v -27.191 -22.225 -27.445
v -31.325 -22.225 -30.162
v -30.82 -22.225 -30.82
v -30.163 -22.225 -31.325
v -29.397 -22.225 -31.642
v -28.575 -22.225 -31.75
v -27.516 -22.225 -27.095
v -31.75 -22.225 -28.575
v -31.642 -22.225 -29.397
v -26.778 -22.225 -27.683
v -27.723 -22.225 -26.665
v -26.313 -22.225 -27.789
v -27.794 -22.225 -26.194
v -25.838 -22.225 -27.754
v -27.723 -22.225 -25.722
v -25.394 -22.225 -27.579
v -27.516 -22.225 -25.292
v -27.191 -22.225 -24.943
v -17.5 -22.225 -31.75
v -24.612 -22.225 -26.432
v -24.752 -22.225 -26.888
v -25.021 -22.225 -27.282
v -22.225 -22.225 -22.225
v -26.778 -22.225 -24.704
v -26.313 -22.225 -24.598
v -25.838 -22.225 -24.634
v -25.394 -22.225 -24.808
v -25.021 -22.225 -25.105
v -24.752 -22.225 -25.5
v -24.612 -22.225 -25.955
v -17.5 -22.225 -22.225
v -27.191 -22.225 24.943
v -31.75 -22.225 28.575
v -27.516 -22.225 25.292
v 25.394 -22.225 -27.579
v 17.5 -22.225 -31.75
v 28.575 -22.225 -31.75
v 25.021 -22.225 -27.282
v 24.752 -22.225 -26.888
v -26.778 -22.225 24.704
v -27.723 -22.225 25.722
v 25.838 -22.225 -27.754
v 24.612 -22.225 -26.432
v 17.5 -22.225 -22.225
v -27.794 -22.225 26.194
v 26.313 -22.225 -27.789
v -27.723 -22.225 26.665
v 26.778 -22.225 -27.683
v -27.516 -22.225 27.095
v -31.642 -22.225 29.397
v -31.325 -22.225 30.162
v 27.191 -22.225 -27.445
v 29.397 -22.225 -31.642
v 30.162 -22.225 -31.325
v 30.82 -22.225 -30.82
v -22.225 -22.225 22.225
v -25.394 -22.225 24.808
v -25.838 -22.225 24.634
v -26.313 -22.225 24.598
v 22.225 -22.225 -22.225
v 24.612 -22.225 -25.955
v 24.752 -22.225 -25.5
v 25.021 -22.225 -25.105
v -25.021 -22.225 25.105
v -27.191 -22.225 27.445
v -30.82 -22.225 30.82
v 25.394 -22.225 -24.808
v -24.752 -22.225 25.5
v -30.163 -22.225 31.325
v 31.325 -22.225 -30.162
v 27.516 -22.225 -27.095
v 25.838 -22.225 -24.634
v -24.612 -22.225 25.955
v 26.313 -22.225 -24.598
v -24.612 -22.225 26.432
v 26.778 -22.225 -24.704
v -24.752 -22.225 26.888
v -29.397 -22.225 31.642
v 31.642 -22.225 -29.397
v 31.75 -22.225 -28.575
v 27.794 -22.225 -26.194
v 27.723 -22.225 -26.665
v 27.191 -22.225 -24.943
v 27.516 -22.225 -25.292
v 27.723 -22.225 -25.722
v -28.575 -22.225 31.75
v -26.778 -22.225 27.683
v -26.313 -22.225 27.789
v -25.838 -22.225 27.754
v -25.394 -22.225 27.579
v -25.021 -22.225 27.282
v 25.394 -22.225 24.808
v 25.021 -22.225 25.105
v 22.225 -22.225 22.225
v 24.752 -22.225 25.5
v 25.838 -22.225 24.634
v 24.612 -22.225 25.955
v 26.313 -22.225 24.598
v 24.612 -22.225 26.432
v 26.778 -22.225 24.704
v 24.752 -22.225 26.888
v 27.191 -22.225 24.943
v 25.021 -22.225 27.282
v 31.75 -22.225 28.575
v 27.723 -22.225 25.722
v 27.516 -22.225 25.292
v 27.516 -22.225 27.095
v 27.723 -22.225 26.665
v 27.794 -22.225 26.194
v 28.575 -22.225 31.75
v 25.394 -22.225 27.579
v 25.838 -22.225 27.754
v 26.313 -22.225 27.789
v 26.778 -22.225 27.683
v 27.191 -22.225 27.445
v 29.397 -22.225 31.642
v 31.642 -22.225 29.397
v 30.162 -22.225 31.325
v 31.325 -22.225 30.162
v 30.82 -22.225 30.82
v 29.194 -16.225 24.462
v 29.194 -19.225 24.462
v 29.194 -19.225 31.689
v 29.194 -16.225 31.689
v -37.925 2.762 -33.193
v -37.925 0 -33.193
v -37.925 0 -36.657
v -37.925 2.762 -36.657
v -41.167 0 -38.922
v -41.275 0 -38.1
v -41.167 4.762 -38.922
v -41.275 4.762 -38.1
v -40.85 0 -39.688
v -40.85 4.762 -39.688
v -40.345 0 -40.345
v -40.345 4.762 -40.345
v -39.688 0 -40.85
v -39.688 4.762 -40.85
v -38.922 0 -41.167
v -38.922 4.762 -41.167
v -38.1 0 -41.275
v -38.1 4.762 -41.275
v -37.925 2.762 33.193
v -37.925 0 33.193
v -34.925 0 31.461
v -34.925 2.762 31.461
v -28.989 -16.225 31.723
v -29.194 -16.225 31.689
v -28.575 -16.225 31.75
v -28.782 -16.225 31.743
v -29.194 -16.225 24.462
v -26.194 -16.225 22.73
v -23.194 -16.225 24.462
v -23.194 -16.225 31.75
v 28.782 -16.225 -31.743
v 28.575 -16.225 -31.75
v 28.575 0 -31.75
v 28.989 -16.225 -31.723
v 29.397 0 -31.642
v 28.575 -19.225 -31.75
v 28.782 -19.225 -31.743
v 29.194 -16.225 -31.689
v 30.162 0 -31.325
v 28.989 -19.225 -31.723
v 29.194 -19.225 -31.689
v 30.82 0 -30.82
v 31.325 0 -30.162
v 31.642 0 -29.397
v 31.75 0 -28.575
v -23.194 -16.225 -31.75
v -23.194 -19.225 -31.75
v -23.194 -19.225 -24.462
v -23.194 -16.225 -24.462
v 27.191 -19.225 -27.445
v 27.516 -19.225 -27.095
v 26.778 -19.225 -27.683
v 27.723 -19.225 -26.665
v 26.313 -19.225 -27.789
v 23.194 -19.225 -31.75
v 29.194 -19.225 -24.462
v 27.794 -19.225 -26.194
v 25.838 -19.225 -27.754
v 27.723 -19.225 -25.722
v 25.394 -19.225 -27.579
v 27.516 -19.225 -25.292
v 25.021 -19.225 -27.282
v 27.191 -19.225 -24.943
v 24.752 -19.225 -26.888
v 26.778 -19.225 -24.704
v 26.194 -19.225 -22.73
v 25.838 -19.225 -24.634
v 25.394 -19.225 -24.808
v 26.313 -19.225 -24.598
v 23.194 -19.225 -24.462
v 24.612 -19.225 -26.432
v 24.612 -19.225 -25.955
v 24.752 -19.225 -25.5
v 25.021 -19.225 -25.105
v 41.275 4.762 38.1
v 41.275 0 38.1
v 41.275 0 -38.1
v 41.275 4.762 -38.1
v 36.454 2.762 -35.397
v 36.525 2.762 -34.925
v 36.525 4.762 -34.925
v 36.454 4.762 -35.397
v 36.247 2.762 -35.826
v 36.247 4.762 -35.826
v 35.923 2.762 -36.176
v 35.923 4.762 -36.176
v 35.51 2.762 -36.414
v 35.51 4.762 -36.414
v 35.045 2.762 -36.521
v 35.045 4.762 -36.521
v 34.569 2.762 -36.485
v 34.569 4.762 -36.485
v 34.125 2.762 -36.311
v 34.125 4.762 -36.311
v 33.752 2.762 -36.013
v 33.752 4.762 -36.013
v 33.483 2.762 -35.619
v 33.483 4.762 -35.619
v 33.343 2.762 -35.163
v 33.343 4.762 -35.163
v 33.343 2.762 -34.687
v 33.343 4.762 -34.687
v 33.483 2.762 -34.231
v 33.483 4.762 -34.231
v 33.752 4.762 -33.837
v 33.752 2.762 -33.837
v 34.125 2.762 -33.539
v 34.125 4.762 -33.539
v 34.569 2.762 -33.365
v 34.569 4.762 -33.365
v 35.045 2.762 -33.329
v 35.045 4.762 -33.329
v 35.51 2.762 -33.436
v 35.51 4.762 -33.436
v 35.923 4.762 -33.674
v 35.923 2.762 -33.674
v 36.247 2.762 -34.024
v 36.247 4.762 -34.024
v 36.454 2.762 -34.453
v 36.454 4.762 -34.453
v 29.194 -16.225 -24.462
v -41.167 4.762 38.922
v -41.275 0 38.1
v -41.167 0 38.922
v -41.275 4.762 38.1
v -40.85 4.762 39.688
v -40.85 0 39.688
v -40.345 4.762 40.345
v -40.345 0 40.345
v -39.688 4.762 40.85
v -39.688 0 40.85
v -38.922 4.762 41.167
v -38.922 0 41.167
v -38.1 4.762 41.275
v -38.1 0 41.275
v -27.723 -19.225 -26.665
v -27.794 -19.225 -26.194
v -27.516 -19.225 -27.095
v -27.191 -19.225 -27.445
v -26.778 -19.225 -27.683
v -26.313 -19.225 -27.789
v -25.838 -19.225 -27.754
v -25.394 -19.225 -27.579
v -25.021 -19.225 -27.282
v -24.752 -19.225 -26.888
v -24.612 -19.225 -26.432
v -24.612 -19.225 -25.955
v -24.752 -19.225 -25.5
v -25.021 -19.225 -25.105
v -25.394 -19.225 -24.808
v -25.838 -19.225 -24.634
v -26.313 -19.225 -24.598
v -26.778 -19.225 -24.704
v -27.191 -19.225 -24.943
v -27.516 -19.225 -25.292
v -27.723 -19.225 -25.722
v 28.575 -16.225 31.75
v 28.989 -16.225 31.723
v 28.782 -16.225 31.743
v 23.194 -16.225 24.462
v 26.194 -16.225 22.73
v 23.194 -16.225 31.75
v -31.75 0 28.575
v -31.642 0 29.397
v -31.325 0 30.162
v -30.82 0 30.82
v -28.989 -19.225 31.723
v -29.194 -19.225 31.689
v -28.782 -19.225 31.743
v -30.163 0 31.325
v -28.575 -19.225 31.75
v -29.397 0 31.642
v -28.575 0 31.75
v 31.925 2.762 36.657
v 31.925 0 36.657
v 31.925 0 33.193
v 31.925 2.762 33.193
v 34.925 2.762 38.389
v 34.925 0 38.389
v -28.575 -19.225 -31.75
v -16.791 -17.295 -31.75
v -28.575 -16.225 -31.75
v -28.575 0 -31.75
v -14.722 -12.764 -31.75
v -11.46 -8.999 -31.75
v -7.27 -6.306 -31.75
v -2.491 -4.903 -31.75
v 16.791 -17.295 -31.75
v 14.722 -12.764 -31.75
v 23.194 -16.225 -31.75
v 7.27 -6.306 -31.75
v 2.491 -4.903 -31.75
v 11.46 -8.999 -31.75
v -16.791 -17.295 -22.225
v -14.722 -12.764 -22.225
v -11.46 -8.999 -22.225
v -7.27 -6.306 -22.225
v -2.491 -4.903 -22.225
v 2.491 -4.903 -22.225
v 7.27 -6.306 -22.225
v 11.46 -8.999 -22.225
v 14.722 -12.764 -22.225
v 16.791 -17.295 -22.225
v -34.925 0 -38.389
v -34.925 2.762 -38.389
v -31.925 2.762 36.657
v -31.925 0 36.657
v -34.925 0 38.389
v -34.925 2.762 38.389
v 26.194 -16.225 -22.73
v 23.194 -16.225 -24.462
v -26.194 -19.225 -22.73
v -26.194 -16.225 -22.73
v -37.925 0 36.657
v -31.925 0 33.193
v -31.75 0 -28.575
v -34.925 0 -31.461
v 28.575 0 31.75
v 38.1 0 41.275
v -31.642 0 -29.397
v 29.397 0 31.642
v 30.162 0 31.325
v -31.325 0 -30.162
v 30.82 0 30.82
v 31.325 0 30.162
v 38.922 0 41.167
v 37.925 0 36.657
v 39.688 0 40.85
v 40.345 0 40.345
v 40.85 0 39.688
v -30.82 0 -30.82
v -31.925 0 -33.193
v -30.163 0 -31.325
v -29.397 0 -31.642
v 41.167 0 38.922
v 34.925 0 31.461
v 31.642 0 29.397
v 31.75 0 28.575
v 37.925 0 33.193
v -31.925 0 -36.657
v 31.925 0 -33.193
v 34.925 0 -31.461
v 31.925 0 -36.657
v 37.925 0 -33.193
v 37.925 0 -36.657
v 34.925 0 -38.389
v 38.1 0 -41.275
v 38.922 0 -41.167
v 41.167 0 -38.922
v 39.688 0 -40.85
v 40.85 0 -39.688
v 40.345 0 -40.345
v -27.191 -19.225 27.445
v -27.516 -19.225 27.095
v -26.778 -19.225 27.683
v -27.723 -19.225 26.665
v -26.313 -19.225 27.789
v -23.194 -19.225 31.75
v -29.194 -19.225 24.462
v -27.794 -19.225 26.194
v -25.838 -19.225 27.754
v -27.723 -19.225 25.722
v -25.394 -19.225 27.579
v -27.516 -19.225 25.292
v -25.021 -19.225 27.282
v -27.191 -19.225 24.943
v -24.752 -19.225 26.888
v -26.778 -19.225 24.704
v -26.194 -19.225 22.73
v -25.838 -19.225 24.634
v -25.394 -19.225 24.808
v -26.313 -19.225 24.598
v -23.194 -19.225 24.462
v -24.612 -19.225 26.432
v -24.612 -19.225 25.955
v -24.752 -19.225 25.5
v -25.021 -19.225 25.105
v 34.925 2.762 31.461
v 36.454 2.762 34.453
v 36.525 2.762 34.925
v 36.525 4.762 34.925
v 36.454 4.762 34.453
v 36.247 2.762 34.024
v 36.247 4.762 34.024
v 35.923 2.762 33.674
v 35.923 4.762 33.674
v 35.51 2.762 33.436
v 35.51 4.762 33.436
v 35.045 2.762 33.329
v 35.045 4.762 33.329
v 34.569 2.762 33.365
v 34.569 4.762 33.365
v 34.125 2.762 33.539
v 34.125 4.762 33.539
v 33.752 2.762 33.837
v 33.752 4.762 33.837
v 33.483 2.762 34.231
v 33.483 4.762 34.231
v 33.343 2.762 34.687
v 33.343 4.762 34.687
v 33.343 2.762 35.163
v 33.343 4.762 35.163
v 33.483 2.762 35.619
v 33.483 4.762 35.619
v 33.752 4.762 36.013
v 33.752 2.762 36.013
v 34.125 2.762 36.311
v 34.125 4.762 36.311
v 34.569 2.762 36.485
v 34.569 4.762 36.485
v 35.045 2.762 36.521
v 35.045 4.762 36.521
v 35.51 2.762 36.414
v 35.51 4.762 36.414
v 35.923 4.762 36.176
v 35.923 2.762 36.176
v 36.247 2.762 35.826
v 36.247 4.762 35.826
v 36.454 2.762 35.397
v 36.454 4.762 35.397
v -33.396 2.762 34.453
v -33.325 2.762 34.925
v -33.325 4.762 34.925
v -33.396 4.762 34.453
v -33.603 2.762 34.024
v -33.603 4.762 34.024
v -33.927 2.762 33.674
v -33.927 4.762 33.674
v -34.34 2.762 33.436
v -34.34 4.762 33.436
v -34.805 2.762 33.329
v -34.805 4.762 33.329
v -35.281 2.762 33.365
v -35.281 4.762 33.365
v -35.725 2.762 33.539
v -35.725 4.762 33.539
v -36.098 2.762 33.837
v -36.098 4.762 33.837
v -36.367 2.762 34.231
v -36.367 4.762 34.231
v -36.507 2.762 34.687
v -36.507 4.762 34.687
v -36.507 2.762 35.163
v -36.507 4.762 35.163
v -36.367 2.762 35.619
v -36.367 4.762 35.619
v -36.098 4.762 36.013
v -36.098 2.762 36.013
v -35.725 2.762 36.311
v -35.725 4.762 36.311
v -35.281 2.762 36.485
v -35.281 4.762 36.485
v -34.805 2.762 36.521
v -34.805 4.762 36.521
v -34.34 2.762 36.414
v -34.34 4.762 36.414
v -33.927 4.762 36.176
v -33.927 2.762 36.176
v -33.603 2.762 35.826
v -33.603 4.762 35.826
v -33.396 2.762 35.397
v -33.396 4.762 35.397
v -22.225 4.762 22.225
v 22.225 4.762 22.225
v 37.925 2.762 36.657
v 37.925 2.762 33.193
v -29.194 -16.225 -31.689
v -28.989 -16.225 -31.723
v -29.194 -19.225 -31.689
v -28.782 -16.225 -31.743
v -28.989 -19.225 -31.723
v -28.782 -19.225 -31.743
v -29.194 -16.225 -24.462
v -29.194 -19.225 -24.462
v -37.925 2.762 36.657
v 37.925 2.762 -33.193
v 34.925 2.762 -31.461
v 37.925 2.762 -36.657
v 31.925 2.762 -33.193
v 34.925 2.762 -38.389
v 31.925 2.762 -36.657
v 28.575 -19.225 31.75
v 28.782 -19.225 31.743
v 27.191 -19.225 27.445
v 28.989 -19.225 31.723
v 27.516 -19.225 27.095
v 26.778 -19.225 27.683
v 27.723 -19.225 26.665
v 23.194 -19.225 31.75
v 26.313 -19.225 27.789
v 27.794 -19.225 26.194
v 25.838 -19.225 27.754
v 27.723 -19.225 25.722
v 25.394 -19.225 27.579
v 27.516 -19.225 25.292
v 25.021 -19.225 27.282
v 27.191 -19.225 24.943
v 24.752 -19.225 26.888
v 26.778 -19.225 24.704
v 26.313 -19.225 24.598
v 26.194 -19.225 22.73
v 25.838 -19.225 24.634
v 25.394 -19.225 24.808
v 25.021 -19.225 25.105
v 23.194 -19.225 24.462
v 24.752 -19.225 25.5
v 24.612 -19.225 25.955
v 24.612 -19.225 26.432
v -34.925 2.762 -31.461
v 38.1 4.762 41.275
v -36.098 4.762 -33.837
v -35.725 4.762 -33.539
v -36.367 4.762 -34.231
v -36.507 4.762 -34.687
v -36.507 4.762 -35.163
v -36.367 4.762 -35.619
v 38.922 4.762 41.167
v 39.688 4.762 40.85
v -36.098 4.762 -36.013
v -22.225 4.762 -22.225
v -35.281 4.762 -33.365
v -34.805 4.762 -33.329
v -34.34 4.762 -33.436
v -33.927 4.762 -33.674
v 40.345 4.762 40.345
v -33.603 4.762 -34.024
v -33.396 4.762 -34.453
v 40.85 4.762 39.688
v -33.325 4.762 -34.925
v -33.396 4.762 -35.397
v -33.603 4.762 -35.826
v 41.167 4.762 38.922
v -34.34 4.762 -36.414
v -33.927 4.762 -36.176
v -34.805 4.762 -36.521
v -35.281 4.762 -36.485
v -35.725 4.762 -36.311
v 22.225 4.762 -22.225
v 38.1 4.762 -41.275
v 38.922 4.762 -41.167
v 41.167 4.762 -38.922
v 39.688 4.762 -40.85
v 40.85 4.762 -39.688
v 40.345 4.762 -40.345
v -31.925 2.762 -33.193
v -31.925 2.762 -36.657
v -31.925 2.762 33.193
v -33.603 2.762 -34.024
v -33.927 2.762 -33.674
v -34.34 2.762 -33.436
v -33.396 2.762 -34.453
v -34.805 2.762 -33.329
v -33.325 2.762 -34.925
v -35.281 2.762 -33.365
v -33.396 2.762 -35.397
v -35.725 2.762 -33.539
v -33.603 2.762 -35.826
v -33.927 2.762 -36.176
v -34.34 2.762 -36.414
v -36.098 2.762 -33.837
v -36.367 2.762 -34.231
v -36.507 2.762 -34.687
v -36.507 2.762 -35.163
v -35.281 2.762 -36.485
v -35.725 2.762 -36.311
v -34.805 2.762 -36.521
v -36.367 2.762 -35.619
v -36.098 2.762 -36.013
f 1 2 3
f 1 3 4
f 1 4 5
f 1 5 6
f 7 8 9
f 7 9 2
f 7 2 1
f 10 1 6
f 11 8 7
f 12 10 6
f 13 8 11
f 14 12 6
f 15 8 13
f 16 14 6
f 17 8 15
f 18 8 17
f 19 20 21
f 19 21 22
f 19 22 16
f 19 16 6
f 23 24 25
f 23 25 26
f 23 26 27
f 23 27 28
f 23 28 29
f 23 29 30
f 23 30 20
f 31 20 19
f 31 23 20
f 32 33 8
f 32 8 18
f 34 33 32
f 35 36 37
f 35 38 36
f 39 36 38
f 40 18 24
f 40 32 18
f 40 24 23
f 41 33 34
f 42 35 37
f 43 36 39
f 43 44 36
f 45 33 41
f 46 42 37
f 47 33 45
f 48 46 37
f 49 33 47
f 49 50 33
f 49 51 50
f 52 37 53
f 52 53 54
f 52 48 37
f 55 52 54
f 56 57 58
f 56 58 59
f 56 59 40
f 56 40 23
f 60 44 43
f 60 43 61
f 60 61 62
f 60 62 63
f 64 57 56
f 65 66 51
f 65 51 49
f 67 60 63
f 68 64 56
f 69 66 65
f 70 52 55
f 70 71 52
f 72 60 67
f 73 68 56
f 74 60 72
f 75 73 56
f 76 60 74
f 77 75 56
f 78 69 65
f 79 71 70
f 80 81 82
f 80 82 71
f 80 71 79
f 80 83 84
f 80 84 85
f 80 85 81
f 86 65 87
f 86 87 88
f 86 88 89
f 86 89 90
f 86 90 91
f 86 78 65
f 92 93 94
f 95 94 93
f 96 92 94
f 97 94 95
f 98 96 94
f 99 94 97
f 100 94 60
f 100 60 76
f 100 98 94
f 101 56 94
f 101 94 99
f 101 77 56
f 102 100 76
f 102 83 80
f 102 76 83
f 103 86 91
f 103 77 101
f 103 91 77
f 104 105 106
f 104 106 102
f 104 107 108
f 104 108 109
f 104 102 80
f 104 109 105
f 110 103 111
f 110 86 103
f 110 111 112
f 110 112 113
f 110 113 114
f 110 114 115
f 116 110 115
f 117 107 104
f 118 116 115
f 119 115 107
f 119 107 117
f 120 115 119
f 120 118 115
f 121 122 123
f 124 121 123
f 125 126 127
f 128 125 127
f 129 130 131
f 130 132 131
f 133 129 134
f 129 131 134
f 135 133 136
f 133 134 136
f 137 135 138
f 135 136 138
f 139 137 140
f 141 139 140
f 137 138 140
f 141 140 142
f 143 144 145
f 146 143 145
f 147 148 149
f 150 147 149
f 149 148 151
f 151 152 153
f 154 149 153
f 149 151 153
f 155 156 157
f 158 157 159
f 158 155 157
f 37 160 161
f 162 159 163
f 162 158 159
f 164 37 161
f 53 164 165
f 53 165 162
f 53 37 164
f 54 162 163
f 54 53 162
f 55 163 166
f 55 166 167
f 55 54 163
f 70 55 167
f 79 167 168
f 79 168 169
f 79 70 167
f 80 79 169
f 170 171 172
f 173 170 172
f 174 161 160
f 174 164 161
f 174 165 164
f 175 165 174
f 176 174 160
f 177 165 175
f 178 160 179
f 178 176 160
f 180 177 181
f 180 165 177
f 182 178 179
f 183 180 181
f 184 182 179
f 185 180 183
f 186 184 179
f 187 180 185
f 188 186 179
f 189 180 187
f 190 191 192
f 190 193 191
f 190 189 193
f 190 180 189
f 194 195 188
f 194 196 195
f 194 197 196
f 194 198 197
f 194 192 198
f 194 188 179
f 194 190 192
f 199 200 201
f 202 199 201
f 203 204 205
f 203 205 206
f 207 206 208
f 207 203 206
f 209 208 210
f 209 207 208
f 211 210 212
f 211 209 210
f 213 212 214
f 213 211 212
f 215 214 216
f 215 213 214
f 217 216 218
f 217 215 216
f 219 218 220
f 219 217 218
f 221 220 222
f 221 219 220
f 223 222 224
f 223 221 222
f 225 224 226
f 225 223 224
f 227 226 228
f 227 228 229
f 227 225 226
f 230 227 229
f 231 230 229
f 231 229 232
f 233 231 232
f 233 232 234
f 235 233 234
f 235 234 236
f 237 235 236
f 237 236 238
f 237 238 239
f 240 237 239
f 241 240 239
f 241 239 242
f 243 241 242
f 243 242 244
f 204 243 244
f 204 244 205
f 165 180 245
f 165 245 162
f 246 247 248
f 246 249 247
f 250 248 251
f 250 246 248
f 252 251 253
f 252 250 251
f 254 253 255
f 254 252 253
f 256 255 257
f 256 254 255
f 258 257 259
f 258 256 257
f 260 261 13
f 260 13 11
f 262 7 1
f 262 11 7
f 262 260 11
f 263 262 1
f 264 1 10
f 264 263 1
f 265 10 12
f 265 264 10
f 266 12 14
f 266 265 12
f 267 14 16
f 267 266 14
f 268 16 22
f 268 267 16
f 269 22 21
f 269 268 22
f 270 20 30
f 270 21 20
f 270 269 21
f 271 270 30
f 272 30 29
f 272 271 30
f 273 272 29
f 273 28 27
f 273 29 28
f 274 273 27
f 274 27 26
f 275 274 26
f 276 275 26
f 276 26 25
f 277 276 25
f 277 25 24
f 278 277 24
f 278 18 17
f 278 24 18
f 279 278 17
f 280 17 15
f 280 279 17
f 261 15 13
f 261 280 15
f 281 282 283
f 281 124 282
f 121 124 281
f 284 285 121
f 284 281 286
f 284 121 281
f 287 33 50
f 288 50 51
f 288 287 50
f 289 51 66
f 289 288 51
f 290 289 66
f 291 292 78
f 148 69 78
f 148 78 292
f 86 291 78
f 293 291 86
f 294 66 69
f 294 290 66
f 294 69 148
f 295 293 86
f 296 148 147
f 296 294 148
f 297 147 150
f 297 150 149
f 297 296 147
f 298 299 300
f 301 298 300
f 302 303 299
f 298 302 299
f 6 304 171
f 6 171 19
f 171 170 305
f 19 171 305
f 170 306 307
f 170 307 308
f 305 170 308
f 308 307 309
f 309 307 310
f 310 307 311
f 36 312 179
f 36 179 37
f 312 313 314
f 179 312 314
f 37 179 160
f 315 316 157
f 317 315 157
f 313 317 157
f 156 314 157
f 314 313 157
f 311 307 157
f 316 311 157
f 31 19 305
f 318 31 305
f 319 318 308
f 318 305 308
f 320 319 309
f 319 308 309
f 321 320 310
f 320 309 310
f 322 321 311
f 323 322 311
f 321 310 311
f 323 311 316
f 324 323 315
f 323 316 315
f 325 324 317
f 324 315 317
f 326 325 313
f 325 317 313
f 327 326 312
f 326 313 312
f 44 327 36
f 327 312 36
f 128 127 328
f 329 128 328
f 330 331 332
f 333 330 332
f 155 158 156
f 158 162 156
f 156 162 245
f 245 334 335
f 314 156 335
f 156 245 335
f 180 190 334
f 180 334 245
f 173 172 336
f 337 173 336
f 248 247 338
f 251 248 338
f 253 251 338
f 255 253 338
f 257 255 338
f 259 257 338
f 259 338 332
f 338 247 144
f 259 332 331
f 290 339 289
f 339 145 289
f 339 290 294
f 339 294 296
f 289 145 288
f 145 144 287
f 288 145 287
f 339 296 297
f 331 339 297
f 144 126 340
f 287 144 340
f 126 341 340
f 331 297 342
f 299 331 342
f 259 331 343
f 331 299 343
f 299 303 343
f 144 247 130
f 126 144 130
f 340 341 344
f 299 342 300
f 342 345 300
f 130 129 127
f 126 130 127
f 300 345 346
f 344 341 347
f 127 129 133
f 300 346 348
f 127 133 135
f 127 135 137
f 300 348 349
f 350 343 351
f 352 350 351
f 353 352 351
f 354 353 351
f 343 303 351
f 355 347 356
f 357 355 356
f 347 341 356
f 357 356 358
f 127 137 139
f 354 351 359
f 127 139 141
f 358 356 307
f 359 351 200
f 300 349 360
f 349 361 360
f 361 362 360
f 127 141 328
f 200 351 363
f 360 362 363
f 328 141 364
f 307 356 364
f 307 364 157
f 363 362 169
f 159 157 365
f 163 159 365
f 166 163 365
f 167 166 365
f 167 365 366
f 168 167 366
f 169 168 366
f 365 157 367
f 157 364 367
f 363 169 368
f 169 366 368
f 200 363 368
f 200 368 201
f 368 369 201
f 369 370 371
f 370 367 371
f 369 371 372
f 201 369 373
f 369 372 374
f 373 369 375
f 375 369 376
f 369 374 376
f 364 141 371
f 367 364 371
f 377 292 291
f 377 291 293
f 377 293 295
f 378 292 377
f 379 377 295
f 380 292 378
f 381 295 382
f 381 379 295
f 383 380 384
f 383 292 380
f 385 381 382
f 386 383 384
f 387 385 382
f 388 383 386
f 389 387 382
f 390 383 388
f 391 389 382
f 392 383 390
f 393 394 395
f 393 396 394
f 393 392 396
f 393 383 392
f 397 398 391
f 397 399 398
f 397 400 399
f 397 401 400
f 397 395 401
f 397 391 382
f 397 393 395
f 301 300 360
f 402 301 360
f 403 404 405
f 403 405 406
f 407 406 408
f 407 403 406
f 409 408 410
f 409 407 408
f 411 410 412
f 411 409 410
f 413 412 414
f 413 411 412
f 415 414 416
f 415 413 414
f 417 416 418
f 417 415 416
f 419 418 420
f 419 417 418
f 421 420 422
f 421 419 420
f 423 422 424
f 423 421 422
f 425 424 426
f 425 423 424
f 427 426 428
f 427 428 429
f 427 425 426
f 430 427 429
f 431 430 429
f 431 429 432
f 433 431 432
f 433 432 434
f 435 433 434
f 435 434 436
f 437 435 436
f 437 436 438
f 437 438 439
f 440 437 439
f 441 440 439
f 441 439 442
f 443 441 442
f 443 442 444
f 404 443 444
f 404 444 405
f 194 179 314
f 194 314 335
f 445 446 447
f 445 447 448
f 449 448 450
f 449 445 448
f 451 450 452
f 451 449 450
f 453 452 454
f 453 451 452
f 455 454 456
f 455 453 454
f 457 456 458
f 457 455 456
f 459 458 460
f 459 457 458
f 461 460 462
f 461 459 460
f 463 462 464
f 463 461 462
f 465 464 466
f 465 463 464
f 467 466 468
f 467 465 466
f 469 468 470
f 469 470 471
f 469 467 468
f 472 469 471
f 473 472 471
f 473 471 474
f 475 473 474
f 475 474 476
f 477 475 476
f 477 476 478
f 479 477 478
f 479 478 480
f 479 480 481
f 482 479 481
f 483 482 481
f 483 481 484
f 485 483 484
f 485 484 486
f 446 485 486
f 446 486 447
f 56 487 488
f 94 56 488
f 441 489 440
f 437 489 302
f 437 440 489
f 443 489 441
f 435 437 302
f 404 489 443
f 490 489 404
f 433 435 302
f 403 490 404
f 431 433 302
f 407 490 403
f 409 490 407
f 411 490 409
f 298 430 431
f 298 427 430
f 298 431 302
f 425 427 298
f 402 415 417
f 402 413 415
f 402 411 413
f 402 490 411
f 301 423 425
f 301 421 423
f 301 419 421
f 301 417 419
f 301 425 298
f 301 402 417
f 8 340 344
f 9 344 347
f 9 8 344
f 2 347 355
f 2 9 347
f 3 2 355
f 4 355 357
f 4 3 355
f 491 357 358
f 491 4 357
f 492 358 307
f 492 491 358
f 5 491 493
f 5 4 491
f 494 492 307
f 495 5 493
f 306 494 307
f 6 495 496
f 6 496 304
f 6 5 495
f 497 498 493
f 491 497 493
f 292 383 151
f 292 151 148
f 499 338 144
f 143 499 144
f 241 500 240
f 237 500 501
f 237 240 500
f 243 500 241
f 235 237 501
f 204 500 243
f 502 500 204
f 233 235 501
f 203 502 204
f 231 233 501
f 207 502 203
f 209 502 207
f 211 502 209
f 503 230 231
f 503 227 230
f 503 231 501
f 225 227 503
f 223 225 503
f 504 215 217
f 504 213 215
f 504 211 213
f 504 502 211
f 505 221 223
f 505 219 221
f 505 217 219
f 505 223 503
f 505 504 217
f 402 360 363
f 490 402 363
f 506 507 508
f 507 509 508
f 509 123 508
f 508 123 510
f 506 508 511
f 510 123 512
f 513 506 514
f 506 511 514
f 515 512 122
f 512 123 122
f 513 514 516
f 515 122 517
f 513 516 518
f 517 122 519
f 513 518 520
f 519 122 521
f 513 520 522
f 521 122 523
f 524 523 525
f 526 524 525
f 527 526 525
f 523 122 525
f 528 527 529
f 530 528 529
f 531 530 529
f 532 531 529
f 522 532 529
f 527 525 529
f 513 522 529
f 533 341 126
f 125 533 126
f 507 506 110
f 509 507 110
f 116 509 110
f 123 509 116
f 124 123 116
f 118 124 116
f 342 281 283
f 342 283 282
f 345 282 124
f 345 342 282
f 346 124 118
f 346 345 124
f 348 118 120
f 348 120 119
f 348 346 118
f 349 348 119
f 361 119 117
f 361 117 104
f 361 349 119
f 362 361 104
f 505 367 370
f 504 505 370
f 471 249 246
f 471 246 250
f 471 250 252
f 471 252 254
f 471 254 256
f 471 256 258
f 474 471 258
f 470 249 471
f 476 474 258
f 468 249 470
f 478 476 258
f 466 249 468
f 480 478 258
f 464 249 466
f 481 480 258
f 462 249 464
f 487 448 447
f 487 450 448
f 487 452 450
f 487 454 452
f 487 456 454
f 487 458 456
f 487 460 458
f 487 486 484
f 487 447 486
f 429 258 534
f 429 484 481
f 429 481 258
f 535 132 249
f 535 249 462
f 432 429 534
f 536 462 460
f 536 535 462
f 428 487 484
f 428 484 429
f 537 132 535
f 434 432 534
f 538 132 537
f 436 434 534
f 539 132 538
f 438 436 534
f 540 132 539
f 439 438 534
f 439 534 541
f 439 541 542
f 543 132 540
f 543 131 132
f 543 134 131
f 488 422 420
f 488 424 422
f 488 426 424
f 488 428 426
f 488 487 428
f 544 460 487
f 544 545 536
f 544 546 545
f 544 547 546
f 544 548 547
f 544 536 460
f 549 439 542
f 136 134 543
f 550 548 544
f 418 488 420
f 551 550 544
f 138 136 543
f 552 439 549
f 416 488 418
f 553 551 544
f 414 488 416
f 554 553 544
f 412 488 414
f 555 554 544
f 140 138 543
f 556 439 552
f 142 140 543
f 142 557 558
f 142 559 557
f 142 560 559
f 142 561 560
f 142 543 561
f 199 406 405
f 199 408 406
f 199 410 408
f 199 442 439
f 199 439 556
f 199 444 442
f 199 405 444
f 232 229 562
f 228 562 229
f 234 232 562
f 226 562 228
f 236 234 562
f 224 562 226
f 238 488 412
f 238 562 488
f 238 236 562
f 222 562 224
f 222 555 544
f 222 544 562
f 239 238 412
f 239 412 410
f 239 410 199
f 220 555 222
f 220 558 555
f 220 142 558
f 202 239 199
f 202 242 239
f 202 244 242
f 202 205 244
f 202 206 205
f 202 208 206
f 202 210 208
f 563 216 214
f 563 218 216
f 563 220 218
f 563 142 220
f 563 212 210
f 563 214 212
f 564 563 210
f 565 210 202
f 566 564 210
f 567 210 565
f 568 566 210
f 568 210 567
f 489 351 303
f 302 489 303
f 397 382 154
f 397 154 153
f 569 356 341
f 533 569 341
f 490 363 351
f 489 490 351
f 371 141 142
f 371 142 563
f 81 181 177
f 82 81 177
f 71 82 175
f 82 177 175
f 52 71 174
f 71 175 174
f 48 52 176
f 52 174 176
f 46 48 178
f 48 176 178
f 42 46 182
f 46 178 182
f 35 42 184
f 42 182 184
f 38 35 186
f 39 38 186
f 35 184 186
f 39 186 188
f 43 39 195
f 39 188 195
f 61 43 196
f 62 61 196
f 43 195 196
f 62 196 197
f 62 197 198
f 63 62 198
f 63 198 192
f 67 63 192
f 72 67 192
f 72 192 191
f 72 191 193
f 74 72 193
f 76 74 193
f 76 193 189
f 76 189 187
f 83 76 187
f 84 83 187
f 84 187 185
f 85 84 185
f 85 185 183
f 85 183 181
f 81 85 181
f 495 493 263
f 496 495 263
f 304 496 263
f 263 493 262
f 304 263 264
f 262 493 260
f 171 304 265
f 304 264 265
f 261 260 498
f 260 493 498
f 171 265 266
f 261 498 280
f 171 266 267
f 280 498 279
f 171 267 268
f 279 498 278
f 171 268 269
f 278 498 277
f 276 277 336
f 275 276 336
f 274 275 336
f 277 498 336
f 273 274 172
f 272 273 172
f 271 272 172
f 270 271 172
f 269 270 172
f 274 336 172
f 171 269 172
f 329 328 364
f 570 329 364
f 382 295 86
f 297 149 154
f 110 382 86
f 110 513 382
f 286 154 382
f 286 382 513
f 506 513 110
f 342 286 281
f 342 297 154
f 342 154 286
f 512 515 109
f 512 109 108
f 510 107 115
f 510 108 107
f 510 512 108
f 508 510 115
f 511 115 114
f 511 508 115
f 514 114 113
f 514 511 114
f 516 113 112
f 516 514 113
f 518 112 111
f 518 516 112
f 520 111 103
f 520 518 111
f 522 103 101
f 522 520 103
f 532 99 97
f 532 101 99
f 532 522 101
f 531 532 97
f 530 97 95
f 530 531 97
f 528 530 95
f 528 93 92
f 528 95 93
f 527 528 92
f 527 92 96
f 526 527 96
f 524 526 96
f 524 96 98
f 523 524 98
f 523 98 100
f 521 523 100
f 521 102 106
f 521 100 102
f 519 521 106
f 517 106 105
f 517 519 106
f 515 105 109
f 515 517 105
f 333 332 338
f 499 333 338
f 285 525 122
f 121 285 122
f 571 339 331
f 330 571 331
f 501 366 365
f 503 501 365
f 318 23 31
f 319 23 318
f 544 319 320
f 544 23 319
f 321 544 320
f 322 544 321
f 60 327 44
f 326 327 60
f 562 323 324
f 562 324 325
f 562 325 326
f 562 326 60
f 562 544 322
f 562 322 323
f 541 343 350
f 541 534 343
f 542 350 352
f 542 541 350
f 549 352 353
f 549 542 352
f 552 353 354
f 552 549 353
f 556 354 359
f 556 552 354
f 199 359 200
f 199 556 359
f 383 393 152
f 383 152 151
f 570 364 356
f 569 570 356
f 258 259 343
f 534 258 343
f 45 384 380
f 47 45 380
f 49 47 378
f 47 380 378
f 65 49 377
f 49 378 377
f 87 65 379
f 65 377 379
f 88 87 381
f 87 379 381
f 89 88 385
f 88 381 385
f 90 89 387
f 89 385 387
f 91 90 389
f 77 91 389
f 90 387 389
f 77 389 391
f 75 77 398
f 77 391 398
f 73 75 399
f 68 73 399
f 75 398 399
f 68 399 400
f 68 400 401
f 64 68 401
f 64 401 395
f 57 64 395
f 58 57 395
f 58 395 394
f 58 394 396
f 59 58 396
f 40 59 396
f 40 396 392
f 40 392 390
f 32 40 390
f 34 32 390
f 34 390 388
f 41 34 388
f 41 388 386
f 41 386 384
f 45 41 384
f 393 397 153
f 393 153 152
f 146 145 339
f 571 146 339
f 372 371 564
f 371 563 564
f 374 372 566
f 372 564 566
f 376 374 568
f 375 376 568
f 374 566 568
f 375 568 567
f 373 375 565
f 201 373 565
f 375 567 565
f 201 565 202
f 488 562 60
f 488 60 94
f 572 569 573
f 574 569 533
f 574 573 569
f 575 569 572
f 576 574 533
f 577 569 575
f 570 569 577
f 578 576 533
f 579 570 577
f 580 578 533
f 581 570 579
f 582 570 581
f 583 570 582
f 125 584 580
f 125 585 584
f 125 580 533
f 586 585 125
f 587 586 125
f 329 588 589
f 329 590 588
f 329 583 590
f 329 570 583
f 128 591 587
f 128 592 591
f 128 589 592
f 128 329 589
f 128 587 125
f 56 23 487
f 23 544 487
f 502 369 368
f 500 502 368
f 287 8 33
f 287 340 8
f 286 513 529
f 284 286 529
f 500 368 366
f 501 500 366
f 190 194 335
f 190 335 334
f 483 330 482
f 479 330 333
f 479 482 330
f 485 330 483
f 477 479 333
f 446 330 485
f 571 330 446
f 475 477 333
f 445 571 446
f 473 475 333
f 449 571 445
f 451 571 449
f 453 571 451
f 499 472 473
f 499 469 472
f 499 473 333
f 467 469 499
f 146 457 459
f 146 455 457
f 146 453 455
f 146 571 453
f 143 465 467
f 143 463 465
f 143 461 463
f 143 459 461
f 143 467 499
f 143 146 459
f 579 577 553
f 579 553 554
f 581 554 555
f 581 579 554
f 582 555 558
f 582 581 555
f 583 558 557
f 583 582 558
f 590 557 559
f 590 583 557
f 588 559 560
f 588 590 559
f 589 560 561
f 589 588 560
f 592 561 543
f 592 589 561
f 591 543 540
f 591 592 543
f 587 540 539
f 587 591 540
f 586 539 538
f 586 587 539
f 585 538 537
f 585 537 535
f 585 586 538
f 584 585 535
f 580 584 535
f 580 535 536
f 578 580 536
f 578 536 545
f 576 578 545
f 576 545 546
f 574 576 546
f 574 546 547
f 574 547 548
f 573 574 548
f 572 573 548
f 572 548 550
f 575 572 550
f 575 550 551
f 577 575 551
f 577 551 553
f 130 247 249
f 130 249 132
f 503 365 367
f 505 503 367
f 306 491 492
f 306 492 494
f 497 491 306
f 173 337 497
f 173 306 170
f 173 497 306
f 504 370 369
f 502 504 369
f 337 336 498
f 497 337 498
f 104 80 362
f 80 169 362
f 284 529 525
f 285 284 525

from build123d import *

# Parameters (mm, degrees)
SKETCH1_W               = 82.55
SKETCH1_H               = 82.55
SKETCH1_R               = 1.6
SKETCH1_W_2             = 44.45
SKETCH1_H_2             = 44.45
BOSS_EXTRUDE1_DEPTH     = 4.7625
SKETCH2_W               = 63.5
SKETCH2_H               = 63.5
SKETCH2_W_2             = 44.45
SKETCH2_H_2             = 44.45
BOSS_EXTRUDE2_DEPTH     = 6.35
SKETCH3_W               = 63.5
SKETCH3_H               = 63.5
SKETCH3_W_2             = 44.45
SKETCH3_H_2             = 44.45
BOSS_EXTRUDE3_DEPTH     = 15.875
CUT_EXTRUDE1_REACH      = 75.025
SKETCH4_R               = 17.5
FILLET1_R               = 3.175
CUT_EXTRUDE3_START      = -3
CUT_EXTRUDE3_DEPTH      = 3
SKETCH6_R               = 1.6
CUT_EXTRUDE4_DEPTH      = 7
MIRROR2_START           = -3
MIRROR2_COPY_1_DEPTH    = 3
MIRROR2_COPY_2_SKETCH_R = 1.6
MIRROR2_COPY_2_DEPTH    = 7
CUT_EXTRUDE5_DEPTH      = 2.7625


with BuildPart() as part:
    # Sketch1 → Boss-Extrude1 (new body)
    with BuildSketch(Plane(origin=(0, 0, 0), x_dir=(1, 0, 0), z_dir=(0, 1, 0))):
        Rectangle(SKETCH1_W, SKETCH1_H)
        with Locations((-34.925, 34.925)):
            Circle(SKETCH1_R, mode=Mode.SUBTRACT)
        with Locations((34.925, 34.925)):
            Circle(SKETCH1_R, mode=Mode.SUBTRACT)
        with Locations((34.925, -34.925)):
            Circle(SKETCH1_R, mode=Mode.SUBTRACT)
        with Locations((-34.925, -34.925)):
            Circle(SKETCH1_R, mode=Mode.SUBTRACT)
        Rectangle(SKETCH1_W_2, SKETCH1_H_2, mode=Mode.SUBTRACT)
    extrude(amount=BOSS_EXTRUDE1_DEPTH)

    # Sketch2 → Boss-Extrude2 (add)
    with BuildSketch(Plane.XZ):
        Rectangle(SKETCH2_W, SKETCH2_H)
        Rectangle(SKETCH2_W_2, SKETCH2_H_2, mode=Mode.SUBTRACT)
    extrude(amount=BOSS_EXTRUDE2_DEPTH)

    # Sketch3 → Boss-Extrude3 (add)
    with BuildSketch(Plane.XZ.offset(6.35)):
        Rectangle(SKETCH3_W, SKETCH3_H)
        Rectangle(SKETCH3_W_2, SKETCH3_H_2, mode=Mode.SUBTRACT)
    extrude(amount=BOSS_EXTRUDE3_DEPTH)

    # Sketch4 → Cut-Extrude1 (cut, up to next)
    with BuildSketch(Plane(origin=(0, 0, -31.75), x_dir=(-1, 0, 0), z_dir=(0, 0, -1)), mode=Mode.PRIVATE) as cut_extrude1_sk1:
        with Locations((0, -22.225)):
            Circle(SKETCH4_R)
    cut_extrude1_tool1 = extrude(cut_extrude1_sk1.sketch, amount=-CUT_EXTRUDE1_REACH, mode=Mode.PRIVATE) & part.part
    add(cut_extrude1_tool1.solids().sort_by_distance((0, -22.225, -31.75))[0], mode=Mode.SUBTRACT)

    # Fillet1
    fillet1_edges = [part.edges().sort_by_distance(p)[0] for p in [
        (31.75, -11.1125, -31.75),
        (31.75, -11.1125, 31.75),
        (-31.75, -11.1125, 31.75),
        (-31.75, -11.1125, -31.75),
        (41.275, 2.38125, 41.275),
        (-41.275, 2.38125, 41.275),
        (-41.275, 2.38125, -41.275),
        (41.275, 2.38125, -41.275),
    ]]
    fillet(fillet1_edges, radius=FILLET1_R)

    # Sketch5 → Cut-Extrude3 (cut)
    with BuildSketch(Plane.XZ.offset(22.225).offset(CUT_EXTRUDE3_START)):
        Polygon((-23.19375, -27.925800808), (-23.19375, -24.461699192), (-26.19375, -22.729648385), (-29.19375, -24.461699192), (-29.19375, -27.925800808), (-29.19375, -31.75), (-23.19375, -31.75), align=None)
    cut_extrude3 = extrude(amount=-CUT_EXTRUDE3_DEPTH, mode=Mode.SUBTRACT)

    # Sketch6 → Cut-Extrude4 (cut, through all)
    with BuildSketch(Plane(origin=(0, -16.225, 0), x_dir=(-1, 0, 0), z_dir=(0, -1, 0))):
        with Locations((26.19375, 26.19375)):
            Circle(SKETCH6_R)
    cut_extrude4 = extrude(amount=CUT_EXTRUDE4_DEPTH, mode=Mode.SUBTRACT)

    # Mirror1: Cut-Extrude3, Cut-Extrude4 across plane
    add(cut_extrude3.mirror(Plane(origin=(0, 0, 0), x_dir=(0, 0, 1), z_dir=(1, 0, 0))), mode=Mode.SUBTRACT)
    add(cut_extrude4.mirror(Plane(origin=(0, 0, 0), x_dir=(0, 0, 1), z_dir=(1, 0, 0))), mode=Mode.SUBTRACT)

    # Mirror2: Cut-Extrude4, Cut-Extrude3 across plane
    add(cut_extrude4.mirror(Plane.XY), mode=Mode.SUBTRACT)
    add(cut_extrude3.mirror(Plane.XY), mode=Mode.SUBTRACT)

    # Mirror2 copy 1 sketch → Mirror2 copy 1 (cut)
    with BuildSketch(Plane(origin=(0, -22.225, 0), x_dir=(-1, 0, 0), z_dir=(0, -1, 0)).offset(MIRROR2_START)):
        Polygon((-23.19375, -27.925800808), (-23.19375, -24.461699192), (-26.19375, -22.729648385), (-29.19375, -24.461699192), (-29.19375, -27.925800808), (-29.19375, -31.75), (-23.19375, -31.75), align=None)
    extrude(amount=-MIRROR2_COPY_1_DEPTH, mode=Mode.SUBTRACT)

    # Mirror2 copy 2 sketch → Mirror2 copy 2 (cut, through all)
    with BuildSketch(Plane.XZ.offset(16.225)):
        with Locations((26.19375, 26.19375)):
            Circle(MIRROR2_COPY_2_SKETCH_R)
    extrude(amount=MIRROR2_COPY_2_DEPTH, mode=Mode.SUBTRACT)

    # Sketch7 → Cut-Extrude5 (cut)
    with BuildSketch(Plane(origin=(0, 0, 0), x_dir=(-1, 0, 0), z_dir=(0, -1, 0))):
        Polygon((34.925, -31.460898385), (31.925, -33.192949192), (31.925, -36.657050808), (34.925, -38.389101615), (37.925, -36.657050808), (37.925, -33.192949192), align=None)
        Polygon((-37.925, -33.192949192), (-37.925, -36.657050808), (-34.925, -38.389101615), (-31.925, -36.657050808), (-31.925, -33.192949192), (-34.925, -31.460898385), align=None)
        Polygon((-37.925, 36.657050808), (-37.925, 33.192949192), (-34.925, 31.460898385), (-31.925, 33.192949192), (-31.925, 36.657050808), (-34.925, 38.389101615), align=None)
        Polygon((31.925, 36.657050808), (31.925, 33.192949192), (34.925, 31.460898385), (37.925, 33.192949192), (37.925, 36.657050808), (34.925, 38.389101615), align=None)
    extrude(amount=-CUT_EXTRUDE5_DEPTH, mode=Mode.SUBTRACT)


solid = part.part
